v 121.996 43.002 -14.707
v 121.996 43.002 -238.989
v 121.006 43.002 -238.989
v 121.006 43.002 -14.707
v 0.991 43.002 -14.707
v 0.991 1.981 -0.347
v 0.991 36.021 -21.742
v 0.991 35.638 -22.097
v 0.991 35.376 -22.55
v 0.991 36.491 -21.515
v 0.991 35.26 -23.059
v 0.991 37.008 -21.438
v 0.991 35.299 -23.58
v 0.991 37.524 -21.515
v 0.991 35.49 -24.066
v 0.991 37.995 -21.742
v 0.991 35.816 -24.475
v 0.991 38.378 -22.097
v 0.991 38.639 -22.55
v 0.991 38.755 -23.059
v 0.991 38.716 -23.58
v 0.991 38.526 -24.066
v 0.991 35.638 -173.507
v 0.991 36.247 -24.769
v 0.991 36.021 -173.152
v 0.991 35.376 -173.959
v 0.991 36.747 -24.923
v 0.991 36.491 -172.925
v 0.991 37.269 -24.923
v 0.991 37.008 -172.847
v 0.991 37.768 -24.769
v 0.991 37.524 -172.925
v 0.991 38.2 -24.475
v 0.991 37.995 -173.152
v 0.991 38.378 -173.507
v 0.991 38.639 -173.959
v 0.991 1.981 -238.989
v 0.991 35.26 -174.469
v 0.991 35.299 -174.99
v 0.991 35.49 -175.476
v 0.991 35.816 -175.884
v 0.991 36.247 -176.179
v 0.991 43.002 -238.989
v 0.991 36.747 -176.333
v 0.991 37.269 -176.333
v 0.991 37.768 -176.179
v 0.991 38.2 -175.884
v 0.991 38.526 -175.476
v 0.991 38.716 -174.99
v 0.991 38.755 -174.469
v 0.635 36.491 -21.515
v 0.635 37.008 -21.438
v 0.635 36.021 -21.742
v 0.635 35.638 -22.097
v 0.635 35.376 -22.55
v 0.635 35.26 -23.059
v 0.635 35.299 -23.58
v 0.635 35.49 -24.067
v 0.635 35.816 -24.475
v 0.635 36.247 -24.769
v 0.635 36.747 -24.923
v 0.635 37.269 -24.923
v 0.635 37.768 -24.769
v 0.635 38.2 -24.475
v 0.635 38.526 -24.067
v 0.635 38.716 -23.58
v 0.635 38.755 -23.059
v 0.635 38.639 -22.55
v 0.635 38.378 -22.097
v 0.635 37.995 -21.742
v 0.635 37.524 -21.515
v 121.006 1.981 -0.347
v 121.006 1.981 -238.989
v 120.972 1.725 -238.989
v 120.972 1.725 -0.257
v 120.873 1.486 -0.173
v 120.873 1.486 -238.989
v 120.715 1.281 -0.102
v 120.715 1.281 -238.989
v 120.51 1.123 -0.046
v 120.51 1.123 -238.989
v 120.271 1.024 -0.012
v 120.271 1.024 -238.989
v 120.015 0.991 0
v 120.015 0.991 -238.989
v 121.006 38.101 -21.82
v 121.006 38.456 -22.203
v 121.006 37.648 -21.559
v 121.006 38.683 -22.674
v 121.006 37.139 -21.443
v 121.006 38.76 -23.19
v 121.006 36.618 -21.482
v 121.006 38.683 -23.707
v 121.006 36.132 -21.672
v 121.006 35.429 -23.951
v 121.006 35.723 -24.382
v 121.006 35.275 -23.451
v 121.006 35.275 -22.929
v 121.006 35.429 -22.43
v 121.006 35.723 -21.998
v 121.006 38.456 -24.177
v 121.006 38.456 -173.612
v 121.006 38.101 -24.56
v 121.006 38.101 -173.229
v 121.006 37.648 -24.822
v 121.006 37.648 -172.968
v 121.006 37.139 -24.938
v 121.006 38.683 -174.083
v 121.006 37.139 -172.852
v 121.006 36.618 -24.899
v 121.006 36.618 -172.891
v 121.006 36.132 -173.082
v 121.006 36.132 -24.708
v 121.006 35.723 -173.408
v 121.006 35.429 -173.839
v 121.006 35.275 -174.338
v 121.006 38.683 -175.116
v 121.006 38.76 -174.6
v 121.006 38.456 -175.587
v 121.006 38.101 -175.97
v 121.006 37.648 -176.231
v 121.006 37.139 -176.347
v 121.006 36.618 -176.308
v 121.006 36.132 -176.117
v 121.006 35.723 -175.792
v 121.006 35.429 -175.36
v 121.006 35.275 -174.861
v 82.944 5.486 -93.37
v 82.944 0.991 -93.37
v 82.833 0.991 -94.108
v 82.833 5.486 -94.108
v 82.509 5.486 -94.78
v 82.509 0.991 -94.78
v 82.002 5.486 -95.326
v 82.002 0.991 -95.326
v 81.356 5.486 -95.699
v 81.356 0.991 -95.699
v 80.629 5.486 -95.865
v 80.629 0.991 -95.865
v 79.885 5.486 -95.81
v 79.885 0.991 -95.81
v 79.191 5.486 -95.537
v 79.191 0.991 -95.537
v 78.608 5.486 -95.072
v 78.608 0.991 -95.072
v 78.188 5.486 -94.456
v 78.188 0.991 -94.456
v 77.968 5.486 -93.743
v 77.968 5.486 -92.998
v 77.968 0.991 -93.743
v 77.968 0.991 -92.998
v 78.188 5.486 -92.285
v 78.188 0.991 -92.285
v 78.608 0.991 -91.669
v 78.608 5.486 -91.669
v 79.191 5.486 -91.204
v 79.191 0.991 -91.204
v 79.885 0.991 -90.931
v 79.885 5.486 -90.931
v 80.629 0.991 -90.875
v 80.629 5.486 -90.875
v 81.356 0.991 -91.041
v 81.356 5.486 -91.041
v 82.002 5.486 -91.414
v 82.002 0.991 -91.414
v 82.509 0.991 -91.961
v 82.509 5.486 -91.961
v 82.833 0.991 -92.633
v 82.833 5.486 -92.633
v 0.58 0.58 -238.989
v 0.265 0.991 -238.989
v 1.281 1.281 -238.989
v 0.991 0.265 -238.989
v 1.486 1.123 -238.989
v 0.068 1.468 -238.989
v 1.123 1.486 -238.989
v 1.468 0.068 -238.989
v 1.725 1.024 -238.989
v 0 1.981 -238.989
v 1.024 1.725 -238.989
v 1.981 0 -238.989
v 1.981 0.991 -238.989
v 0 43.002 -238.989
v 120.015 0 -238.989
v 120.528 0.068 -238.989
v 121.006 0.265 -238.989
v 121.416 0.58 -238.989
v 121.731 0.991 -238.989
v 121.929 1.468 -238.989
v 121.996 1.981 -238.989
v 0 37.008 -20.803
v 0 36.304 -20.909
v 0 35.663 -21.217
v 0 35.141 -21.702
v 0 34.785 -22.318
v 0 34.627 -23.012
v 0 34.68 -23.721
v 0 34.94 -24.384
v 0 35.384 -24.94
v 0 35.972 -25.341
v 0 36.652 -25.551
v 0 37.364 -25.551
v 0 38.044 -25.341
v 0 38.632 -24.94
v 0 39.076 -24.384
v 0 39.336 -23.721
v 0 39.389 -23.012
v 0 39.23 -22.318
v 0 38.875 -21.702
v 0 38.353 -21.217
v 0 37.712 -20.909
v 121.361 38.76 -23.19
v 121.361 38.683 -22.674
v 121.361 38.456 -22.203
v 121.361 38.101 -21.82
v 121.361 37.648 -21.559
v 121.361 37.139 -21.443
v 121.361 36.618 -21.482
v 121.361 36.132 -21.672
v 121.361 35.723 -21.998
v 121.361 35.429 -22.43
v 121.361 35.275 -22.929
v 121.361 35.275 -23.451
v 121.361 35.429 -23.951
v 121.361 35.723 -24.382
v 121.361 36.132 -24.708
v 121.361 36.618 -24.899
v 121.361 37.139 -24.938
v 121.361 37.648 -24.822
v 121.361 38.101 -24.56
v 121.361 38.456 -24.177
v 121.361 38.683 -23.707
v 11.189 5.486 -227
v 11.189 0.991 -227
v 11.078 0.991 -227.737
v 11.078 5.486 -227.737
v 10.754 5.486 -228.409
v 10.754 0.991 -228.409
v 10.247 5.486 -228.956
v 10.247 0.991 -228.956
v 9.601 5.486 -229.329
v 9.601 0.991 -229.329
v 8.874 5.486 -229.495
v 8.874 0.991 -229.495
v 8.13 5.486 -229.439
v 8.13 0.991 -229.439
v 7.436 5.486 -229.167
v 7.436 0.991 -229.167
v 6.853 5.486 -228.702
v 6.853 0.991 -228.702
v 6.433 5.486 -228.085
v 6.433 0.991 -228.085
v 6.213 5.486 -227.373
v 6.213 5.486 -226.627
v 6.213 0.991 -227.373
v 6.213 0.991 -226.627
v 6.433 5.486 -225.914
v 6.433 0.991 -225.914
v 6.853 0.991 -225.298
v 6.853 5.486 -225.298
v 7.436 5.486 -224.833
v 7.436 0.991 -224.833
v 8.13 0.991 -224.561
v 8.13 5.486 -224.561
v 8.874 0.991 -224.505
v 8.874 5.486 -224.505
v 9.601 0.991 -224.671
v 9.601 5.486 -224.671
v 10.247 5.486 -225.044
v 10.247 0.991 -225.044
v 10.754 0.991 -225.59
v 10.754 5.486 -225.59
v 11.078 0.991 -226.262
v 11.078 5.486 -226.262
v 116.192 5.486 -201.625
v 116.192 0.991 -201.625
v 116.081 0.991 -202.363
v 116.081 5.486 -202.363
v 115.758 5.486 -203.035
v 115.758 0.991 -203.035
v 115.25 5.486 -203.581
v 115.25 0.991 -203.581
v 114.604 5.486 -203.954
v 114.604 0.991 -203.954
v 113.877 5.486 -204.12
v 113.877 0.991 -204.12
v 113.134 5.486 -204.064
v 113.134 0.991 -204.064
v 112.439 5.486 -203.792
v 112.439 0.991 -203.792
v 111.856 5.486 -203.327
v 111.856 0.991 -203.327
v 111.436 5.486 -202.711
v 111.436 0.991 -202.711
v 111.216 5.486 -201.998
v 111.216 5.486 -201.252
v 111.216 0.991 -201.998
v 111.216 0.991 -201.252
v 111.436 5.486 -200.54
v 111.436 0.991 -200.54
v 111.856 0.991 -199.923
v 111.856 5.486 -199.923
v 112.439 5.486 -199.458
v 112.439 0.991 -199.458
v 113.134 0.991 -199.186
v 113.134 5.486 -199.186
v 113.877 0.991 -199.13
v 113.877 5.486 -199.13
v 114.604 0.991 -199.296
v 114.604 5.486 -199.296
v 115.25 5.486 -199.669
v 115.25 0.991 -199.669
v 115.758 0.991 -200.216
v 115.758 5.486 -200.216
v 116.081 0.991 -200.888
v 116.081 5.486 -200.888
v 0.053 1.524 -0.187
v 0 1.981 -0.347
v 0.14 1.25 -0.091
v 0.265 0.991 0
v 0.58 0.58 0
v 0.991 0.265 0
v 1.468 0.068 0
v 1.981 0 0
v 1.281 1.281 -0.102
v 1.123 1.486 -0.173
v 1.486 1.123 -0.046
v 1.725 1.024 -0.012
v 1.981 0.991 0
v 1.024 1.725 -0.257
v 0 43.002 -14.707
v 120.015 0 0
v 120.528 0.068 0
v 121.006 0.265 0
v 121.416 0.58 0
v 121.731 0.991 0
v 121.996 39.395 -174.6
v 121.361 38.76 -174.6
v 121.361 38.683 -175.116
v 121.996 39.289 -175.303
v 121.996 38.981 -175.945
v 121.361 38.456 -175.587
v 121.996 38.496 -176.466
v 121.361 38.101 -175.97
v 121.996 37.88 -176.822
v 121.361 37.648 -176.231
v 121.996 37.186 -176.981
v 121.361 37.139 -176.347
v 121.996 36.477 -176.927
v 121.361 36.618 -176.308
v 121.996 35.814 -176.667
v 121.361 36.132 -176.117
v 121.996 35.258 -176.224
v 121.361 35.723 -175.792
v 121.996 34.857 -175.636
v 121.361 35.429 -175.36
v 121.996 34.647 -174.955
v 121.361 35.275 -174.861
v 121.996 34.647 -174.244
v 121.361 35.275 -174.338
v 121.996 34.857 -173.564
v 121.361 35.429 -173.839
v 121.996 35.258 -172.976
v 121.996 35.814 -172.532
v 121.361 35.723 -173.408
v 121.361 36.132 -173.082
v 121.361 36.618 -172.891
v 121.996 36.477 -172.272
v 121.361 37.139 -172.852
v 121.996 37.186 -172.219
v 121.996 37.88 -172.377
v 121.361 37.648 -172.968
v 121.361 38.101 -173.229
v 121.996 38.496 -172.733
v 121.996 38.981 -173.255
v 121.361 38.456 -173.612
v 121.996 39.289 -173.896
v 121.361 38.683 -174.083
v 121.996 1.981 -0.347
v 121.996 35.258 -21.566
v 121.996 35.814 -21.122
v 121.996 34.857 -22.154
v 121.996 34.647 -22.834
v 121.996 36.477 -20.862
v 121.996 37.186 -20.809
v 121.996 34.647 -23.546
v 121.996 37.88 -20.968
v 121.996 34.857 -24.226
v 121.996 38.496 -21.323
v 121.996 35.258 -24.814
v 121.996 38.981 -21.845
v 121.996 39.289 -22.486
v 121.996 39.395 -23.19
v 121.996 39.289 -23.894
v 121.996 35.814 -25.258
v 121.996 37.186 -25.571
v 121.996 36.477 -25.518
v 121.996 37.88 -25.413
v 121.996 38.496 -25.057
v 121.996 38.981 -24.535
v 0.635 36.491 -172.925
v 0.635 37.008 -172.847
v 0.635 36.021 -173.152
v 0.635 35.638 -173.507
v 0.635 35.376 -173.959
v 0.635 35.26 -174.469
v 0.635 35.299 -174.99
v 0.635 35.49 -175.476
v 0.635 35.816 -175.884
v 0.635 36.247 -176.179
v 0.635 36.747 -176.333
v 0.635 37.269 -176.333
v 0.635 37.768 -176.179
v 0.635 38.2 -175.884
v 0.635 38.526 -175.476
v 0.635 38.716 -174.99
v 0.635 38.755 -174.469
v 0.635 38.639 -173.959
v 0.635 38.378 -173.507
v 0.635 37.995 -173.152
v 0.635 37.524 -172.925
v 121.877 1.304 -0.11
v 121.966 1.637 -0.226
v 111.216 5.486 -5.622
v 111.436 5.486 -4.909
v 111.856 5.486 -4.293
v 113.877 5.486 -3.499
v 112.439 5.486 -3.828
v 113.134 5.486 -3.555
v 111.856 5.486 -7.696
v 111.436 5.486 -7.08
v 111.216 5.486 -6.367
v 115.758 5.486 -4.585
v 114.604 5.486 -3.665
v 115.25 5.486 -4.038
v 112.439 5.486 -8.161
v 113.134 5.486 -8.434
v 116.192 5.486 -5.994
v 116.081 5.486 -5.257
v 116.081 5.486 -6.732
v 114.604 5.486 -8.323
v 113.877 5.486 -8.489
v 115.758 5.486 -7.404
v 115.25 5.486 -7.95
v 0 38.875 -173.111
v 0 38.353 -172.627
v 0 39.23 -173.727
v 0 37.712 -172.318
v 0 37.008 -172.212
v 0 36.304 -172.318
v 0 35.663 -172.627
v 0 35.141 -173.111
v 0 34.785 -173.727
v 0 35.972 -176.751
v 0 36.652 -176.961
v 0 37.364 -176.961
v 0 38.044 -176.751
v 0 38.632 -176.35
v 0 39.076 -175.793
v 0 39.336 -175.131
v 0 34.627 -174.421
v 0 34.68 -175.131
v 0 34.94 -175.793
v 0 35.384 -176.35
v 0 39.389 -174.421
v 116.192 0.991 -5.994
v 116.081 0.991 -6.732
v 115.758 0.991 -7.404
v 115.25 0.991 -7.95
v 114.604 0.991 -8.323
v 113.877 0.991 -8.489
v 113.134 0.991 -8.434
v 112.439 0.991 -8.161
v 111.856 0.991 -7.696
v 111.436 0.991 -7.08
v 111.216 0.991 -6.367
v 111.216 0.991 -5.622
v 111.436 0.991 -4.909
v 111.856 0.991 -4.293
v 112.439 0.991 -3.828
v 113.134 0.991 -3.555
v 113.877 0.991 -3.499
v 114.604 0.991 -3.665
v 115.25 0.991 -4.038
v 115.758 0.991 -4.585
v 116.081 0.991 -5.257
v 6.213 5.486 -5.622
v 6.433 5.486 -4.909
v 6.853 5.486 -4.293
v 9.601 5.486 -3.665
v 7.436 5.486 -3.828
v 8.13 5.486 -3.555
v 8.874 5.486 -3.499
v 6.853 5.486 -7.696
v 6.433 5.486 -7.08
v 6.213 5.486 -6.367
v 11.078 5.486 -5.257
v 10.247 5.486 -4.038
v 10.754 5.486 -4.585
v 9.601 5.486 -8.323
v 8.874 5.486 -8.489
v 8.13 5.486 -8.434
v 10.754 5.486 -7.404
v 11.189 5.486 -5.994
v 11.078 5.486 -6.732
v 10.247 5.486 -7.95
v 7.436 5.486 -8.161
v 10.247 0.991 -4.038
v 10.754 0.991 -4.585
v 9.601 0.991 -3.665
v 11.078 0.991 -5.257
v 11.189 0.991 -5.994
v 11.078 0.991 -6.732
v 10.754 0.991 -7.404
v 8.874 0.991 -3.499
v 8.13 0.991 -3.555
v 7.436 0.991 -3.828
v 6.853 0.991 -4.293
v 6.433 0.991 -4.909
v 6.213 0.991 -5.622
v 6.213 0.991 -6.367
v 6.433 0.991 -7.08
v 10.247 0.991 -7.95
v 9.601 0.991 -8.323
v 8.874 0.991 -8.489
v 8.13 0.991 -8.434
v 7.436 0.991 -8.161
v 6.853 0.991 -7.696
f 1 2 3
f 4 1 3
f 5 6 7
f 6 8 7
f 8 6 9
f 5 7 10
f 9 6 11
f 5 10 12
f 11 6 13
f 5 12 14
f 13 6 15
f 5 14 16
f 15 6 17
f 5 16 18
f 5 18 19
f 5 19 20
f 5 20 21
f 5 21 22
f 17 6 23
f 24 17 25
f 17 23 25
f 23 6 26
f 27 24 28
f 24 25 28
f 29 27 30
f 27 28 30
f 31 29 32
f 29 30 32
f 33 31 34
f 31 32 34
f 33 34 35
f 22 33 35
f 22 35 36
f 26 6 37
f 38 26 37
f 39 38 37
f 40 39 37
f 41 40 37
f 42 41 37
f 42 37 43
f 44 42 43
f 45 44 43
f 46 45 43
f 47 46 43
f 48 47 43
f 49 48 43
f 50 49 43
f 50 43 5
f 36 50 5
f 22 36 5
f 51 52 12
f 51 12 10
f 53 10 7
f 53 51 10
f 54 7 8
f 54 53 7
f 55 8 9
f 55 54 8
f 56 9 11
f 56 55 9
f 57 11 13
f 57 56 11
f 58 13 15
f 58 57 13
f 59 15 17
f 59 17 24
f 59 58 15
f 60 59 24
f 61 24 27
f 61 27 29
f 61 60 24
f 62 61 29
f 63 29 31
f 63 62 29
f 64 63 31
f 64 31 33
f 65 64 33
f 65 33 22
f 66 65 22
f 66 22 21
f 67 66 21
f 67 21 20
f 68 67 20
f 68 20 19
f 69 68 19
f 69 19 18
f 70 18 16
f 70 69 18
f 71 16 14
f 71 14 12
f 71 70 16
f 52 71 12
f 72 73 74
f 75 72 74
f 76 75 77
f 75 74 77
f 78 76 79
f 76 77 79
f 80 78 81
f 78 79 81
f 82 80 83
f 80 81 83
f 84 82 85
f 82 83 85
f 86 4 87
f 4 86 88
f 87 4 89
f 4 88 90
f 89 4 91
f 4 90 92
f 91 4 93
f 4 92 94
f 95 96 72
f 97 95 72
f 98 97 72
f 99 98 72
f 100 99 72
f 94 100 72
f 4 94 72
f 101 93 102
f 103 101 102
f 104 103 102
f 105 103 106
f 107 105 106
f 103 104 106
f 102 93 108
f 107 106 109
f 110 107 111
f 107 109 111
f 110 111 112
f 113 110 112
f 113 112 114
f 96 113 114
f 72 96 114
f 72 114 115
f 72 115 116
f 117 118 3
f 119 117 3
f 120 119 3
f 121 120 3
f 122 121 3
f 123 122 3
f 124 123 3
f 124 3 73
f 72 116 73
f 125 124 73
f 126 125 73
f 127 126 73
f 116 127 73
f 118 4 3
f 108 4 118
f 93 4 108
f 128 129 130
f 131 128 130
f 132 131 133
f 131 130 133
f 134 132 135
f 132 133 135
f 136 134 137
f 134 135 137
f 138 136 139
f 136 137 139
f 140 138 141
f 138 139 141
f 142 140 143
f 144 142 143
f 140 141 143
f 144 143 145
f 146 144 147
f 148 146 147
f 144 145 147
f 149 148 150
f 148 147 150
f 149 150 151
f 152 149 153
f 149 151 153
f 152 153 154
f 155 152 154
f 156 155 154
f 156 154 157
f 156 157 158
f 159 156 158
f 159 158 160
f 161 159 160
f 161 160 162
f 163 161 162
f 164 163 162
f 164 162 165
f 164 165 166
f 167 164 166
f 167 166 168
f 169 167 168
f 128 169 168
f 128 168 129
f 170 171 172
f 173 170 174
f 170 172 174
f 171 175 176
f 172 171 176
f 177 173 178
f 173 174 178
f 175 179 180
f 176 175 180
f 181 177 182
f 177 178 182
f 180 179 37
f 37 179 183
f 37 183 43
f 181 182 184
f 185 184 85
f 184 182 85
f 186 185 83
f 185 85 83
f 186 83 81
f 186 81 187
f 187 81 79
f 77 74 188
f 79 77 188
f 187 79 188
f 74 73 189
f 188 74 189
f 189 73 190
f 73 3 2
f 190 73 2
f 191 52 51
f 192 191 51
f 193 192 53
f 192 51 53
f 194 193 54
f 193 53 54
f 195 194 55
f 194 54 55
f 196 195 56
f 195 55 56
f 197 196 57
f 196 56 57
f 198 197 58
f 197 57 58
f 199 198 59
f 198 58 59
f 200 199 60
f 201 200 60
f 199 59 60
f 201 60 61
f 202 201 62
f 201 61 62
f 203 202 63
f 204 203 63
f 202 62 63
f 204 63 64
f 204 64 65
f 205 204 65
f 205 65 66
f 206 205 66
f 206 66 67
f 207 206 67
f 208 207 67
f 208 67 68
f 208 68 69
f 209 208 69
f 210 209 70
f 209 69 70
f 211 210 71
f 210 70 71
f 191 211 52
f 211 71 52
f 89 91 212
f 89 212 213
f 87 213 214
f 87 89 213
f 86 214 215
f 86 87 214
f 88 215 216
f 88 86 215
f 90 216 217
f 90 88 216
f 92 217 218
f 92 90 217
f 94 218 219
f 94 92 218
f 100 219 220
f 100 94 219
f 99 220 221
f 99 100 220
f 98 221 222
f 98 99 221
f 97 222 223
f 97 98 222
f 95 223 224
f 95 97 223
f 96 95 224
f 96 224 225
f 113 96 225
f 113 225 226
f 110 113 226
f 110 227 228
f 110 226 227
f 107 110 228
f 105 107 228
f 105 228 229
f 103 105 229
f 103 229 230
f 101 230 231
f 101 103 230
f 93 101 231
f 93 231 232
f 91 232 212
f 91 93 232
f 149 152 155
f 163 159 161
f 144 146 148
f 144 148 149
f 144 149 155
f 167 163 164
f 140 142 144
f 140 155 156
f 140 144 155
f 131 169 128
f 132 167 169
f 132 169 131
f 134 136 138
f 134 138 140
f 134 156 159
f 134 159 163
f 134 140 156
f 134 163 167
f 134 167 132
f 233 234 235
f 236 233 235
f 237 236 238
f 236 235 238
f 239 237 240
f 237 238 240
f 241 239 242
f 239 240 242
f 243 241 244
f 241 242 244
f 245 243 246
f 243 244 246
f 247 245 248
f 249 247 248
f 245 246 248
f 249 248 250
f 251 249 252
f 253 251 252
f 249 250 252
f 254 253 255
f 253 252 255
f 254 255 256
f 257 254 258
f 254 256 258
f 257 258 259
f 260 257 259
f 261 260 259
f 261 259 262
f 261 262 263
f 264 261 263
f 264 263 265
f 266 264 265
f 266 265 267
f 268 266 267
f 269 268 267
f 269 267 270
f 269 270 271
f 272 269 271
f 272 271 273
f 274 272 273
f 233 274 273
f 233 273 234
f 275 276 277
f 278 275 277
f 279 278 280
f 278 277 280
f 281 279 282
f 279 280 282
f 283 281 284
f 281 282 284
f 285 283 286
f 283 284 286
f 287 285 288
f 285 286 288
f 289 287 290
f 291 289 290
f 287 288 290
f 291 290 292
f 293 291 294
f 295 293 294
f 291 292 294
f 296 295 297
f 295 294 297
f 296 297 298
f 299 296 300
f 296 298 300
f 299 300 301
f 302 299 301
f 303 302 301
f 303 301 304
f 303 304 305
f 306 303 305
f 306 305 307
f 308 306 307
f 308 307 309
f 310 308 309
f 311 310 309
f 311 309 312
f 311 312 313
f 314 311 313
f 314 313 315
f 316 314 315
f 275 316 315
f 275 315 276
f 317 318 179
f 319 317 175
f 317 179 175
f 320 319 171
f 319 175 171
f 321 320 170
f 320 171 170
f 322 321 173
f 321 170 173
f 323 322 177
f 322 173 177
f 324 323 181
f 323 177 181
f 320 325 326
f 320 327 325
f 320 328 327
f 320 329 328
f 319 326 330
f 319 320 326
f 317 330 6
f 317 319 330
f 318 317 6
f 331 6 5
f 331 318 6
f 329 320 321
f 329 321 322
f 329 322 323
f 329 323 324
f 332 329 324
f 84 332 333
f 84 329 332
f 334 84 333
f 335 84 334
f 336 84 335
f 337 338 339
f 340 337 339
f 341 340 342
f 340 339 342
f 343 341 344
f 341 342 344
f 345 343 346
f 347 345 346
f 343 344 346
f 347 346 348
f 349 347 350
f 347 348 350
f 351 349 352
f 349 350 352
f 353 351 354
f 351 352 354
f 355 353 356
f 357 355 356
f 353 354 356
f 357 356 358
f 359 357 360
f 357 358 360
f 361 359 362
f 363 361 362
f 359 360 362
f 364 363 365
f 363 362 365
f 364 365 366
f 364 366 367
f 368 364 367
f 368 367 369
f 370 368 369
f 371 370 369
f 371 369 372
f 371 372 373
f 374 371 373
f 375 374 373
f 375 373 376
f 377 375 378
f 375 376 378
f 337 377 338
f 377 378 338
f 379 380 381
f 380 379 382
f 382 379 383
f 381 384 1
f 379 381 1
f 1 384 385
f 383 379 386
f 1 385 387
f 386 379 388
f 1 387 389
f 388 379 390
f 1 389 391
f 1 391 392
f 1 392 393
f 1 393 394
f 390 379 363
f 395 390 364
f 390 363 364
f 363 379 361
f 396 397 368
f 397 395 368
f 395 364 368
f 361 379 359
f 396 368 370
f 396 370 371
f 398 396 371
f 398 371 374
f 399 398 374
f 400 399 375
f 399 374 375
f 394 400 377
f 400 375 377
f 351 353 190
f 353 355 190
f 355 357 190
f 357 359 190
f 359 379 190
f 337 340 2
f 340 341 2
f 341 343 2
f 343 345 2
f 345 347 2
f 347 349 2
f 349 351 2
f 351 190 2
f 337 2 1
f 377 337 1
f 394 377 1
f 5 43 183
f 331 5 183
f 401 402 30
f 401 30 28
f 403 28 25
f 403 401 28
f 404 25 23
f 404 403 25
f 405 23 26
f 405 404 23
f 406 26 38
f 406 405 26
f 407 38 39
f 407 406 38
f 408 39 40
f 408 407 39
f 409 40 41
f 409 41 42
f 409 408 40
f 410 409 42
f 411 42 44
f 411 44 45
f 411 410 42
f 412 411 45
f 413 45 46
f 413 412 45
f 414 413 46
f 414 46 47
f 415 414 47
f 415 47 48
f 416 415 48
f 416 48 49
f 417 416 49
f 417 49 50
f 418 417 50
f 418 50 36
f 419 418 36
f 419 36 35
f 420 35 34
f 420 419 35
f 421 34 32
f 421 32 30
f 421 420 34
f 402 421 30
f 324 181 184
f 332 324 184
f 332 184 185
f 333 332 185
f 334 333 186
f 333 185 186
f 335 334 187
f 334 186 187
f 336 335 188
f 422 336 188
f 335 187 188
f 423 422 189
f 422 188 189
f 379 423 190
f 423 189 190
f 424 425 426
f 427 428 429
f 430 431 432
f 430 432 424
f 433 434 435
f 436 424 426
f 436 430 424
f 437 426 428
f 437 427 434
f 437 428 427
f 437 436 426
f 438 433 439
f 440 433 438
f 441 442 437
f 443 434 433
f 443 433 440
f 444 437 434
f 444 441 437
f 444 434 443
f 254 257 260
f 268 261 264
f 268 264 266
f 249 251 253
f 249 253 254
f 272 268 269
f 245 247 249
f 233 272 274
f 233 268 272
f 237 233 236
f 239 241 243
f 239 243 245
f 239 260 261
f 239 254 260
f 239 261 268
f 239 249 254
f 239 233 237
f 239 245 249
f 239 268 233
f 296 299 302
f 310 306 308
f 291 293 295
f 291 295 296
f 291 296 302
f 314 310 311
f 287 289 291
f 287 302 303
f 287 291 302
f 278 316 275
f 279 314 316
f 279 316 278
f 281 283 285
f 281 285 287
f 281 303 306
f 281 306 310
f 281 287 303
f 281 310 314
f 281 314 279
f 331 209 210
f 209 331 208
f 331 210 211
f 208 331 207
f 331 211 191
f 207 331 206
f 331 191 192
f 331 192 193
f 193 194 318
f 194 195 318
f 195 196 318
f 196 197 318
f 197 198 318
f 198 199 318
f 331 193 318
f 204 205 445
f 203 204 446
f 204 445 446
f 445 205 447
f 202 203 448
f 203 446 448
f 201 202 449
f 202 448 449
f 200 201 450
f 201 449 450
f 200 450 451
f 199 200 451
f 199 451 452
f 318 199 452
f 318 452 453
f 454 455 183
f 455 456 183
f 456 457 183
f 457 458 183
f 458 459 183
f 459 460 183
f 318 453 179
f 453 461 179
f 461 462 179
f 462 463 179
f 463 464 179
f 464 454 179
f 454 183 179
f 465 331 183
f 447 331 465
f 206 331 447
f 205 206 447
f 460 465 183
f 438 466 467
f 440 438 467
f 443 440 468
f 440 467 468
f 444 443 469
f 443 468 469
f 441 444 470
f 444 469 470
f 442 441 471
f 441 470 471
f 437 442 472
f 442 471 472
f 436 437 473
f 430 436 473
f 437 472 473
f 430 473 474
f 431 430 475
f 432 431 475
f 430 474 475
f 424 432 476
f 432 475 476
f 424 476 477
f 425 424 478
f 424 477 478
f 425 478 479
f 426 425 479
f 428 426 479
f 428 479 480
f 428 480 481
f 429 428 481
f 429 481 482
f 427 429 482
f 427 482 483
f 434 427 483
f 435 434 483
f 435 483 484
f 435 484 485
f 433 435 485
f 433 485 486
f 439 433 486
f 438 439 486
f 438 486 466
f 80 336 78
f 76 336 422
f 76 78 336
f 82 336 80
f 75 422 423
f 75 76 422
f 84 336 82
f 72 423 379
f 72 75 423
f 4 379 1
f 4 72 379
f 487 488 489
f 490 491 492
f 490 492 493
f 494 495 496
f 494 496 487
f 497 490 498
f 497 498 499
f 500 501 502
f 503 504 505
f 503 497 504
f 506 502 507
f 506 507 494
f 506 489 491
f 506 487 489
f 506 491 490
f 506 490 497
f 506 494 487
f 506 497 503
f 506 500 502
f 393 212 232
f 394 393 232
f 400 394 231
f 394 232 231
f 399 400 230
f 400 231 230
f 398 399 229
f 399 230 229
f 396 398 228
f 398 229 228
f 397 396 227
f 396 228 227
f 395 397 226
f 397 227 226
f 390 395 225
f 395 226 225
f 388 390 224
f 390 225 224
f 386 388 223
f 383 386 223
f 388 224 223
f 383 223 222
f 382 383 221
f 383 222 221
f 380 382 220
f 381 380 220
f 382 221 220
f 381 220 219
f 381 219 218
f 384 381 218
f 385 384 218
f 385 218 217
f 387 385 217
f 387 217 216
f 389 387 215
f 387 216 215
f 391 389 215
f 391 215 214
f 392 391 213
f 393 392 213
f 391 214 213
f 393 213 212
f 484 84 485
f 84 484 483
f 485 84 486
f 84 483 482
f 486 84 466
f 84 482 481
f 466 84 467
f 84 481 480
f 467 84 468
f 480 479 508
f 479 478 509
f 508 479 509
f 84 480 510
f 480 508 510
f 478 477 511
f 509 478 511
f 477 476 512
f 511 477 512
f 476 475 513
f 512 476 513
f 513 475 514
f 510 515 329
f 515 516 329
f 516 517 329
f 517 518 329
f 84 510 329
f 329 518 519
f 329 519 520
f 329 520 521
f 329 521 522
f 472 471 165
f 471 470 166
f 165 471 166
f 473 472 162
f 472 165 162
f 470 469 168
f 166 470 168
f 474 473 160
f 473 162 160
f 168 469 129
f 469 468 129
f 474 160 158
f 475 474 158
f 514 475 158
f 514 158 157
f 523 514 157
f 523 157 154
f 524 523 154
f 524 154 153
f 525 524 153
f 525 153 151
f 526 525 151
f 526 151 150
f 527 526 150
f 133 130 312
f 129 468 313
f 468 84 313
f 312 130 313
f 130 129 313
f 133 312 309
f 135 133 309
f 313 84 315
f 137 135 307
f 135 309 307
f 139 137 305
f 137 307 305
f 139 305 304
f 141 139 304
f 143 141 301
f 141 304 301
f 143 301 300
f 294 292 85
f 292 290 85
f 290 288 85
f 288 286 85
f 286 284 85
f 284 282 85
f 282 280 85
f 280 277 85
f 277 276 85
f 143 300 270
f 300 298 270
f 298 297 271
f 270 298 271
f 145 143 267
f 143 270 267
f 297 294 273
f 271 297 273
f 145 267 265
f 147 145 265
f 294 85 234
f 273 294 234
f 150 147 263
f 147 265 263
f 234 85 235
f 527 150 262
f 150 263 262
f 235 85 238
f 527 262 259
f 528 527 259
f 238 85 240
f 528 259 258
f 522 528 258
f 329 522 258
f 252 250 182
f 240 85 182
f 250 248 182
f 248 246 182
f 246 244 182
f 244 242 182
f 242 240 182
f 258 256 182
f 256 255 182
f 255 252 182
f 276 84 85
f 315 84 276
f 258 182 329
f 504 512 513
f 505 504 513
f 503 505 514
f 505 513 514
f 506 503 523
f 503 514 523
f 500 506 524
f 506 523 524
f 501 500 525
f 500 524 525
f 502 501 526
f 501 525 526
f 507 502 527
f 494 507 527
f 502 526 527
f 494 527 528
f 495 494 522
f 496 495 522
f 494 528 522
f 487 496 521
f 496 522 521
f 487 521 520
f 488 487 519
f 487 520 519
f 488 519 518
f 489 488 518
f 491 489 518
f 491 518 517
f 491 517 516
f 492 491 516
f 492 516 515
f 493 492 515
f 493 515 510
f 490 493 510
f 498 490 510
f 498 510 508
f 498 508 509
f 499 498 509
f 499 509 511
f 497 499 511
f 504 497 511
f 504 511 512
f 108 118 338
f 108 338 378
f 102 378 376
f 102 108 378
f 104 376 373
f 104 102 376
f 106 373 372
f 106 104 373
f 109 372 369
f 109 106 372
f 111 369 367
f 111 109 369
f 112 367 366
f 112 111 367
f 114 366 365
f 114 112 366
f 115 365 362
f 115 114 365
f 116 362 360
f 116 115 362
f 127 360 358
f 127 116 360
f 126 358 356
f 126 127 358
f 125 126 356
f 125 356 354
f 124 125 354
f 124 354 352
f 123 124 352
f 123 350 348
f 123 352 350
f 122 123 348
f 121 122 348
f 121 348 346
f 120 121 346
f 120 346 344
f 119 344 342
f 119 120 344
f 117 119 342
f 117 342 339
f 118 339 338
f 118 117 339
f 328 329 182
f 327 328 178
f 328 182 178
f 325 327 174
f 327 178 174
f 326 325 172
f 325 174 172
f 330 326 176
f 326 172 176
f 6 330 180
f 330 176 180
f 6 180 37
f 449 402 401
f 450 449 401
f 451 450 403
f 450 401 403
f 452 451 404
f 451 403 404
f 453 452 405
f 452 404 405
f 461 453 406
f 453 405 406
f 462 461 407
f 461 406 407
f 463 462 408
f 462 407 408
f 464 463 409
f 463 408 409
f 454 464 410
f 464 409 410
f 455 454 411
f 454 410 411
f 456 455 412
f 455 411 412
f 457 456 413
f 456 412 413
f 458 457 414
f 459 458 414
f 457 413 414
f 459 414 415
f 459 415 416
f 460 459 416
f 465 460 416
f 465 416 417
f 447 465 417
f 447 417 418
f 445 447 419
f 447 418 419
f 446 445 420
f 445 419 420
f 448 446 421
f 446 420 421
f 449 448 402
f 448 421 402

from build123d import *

# Parameters (mm, degrees)
CUT_EXTRUDE2_OUTLINE_R   = 2.5019
CUT_EXTRUDE2_DEPTH       = 5.4864
CUT_EXTRUDE2_START       = -238.9886
CUT_EXTRUDE2_2_DEPTH     = 238.9886
CUT_EXTRUDE2_START_2     = -1
CUT_EXTRUDE2_3_DEPTH     = 124
CUT_EXTRUDE2_START_3     = 120.015
CUT_EXTRUDE2_4_OUTLINE_R = 1.7526
CUT_EXTRUDE2_4_DEPTH     = 2.985
CHAMFER1_SIZE            = 0.635
CHAMFER2_SIZE            = 0.635
CUT_EXTRUDE3_START       = -0.9906
SKETCH2_R                = 1.7526
CUT_EXTRUDE3_DEPTH       = 0.9906
CHAMFER3_SIZE            = 0.635


with BuildPart() as part:
    # Cut-Extrude2: read off the stored shape, not the designer's step
    # Cut-Extrude2 outline → Cut-Extrude2 (new body)
    with BuildSketch(Plane(origin=(0, 0, 0), x_dir=(1, 0, 0), z_dir=(0, 1, 0))):
        with Locations((113.6904, 201.6252)):
            Circle(CUT_EXTRUDE2_OUTLINE_R)
        with Locations((80.4418, 93.3704)):
            Circle(CUT_EXTRUDE2_OUTLINE_R)
        with Locations((113.6904, 5.9944)):
            Circle(CUT_EXTRUDE2_OUTLINE_R)
        with Locations((8.6868, 5.9944)):
            Circle(CUT_EXTRUDE2_OUTLINE_R)
        with Locations((8.6868, 226.9998)):
            Circle(CUT_EXTRUDE2_OUTLINE_R)
    extrude(amount=CUT_EXTRUDE2_DEPTH)

    # Cut-Extrude2 2 outline → Cut-Extrude2 2 (add)
    with BuildSketch(Plane.XY.offset(CUT_EXTRUDE2_START)):
        with BuildLine():
            Line((121.9962, 1.9812), (121.9962, 43.0022))
            Line((121.9962, 43.0022), (121.0056, 43.0022))
            Line((121.0056, 43.0022), (121.0056, 1.9812))
            ThreePointArc((121.0056, 1.9812), (120.715459977, 1.280740023), (120.015, 0.9906))
            Line((120.015, 0.9906), (1.9812, 0.9906))
            ThreePointArc((1.9812, 0.9906), (1.280740019, 1.280740026), (0.9906, 1.98120001))
            Line((0.9906, 1.98120001), (0.9906, 43.0022))
            Line((0.9906, 43.0022), (0, 43.0022))
            Line((0, 43.0022), (0, 1.98120001))
            ThreePointArc((0, 1.98120001), (0.580280042, 0.580280049), (1.9812, 0))
            Line((1.9812, 0), (120.014999999, 0))
            ThreePointArc((120.014999999, 0), (121.415919955, 0.580280045), (121.9962, 1.9812))
        make_face()
    extrude(amount=CUT_EXTRUDE2_2_DEPTH)

    # Cut-Extrude2 3 outline → Cut-Extrude2 3 (cut)
    with BuildSketch(Plane.YZ.offset(CUT_EXTRUDE2_START_2)):
        Polygon((43.0022, 0), (0.9906, 0), (43.002200003, -14.706600001), align=None)
    extrude(amount=CUT_EXTRUDE2_3_DEPTH, mode=Mode.SUBTRACT)

    # Cut-Extrude2 4 outline → Cut-Extrude2 4 (cut)
    with BuildSketch(Plane.YZ.offset(CUT_EXTRUDE2_START_3)):
        with Locations((37.0078, -23.1902)):
            Circle(CUT_EXTRUDE2_4_OUTLINE_R)
        with Locations((37.0078, -174.5996)):
            Circle(CUT_EXTRUDE2_4_OUTLINE_R)
    extrude(amount=CUT_EXTRUDE2_4_DEPTH, mode=Mode.SUBTRACT)

    # Chamfer1
    chamfer1_edges = [part.edges().sort_by_distance(p)[0] for p in [
        (121.9962, 35.2552, -23.1902),
    ]]
    chamfer(chamfer1_edges, length=CHAMFER1_SIZE)

    # Chamfer2
    chamfer2_edges = [part.edges().sort_by_distance(p)[0] for p in [
        (121.9962, 35.2552, -174.5996),
    ]]
    chamfer(chamfer2_edges, length=CHAMFER2_SIZE)

    # Sketch2 → Cut-Extrude3 (cut)
    with BuildSketch(Plane(origin=(0.9906, 0, 0), x_dir=(0, 0, -1), z_dir=(1, 0, 0)).offset(CUT_EXTRUDE3_START)):
        with Locations(Location((23.1902, 37.0078, 0), (0, 0, 180))):
            Circle(SKETCH2_R)
        with Locations(Location((174.5996, 37.0078, 0), (0, 0, 180))):
            Circle(SKETCH2_R)
    extrude(amount=CUT_EXTRUDE3_DEPTH, mode=Mode.SUBTRACT)

    # Chamfer3
    chamfer3_edges = [part.edges().sort_by_distance(p)[0] for p in [
        (0, 37.0078, -24.9428),
        (0, 37.0078, -176.3522),
    ]]
    chamfer(chamfer3_edges, length=CHAMFER3_SIZE)


solid = part.part
